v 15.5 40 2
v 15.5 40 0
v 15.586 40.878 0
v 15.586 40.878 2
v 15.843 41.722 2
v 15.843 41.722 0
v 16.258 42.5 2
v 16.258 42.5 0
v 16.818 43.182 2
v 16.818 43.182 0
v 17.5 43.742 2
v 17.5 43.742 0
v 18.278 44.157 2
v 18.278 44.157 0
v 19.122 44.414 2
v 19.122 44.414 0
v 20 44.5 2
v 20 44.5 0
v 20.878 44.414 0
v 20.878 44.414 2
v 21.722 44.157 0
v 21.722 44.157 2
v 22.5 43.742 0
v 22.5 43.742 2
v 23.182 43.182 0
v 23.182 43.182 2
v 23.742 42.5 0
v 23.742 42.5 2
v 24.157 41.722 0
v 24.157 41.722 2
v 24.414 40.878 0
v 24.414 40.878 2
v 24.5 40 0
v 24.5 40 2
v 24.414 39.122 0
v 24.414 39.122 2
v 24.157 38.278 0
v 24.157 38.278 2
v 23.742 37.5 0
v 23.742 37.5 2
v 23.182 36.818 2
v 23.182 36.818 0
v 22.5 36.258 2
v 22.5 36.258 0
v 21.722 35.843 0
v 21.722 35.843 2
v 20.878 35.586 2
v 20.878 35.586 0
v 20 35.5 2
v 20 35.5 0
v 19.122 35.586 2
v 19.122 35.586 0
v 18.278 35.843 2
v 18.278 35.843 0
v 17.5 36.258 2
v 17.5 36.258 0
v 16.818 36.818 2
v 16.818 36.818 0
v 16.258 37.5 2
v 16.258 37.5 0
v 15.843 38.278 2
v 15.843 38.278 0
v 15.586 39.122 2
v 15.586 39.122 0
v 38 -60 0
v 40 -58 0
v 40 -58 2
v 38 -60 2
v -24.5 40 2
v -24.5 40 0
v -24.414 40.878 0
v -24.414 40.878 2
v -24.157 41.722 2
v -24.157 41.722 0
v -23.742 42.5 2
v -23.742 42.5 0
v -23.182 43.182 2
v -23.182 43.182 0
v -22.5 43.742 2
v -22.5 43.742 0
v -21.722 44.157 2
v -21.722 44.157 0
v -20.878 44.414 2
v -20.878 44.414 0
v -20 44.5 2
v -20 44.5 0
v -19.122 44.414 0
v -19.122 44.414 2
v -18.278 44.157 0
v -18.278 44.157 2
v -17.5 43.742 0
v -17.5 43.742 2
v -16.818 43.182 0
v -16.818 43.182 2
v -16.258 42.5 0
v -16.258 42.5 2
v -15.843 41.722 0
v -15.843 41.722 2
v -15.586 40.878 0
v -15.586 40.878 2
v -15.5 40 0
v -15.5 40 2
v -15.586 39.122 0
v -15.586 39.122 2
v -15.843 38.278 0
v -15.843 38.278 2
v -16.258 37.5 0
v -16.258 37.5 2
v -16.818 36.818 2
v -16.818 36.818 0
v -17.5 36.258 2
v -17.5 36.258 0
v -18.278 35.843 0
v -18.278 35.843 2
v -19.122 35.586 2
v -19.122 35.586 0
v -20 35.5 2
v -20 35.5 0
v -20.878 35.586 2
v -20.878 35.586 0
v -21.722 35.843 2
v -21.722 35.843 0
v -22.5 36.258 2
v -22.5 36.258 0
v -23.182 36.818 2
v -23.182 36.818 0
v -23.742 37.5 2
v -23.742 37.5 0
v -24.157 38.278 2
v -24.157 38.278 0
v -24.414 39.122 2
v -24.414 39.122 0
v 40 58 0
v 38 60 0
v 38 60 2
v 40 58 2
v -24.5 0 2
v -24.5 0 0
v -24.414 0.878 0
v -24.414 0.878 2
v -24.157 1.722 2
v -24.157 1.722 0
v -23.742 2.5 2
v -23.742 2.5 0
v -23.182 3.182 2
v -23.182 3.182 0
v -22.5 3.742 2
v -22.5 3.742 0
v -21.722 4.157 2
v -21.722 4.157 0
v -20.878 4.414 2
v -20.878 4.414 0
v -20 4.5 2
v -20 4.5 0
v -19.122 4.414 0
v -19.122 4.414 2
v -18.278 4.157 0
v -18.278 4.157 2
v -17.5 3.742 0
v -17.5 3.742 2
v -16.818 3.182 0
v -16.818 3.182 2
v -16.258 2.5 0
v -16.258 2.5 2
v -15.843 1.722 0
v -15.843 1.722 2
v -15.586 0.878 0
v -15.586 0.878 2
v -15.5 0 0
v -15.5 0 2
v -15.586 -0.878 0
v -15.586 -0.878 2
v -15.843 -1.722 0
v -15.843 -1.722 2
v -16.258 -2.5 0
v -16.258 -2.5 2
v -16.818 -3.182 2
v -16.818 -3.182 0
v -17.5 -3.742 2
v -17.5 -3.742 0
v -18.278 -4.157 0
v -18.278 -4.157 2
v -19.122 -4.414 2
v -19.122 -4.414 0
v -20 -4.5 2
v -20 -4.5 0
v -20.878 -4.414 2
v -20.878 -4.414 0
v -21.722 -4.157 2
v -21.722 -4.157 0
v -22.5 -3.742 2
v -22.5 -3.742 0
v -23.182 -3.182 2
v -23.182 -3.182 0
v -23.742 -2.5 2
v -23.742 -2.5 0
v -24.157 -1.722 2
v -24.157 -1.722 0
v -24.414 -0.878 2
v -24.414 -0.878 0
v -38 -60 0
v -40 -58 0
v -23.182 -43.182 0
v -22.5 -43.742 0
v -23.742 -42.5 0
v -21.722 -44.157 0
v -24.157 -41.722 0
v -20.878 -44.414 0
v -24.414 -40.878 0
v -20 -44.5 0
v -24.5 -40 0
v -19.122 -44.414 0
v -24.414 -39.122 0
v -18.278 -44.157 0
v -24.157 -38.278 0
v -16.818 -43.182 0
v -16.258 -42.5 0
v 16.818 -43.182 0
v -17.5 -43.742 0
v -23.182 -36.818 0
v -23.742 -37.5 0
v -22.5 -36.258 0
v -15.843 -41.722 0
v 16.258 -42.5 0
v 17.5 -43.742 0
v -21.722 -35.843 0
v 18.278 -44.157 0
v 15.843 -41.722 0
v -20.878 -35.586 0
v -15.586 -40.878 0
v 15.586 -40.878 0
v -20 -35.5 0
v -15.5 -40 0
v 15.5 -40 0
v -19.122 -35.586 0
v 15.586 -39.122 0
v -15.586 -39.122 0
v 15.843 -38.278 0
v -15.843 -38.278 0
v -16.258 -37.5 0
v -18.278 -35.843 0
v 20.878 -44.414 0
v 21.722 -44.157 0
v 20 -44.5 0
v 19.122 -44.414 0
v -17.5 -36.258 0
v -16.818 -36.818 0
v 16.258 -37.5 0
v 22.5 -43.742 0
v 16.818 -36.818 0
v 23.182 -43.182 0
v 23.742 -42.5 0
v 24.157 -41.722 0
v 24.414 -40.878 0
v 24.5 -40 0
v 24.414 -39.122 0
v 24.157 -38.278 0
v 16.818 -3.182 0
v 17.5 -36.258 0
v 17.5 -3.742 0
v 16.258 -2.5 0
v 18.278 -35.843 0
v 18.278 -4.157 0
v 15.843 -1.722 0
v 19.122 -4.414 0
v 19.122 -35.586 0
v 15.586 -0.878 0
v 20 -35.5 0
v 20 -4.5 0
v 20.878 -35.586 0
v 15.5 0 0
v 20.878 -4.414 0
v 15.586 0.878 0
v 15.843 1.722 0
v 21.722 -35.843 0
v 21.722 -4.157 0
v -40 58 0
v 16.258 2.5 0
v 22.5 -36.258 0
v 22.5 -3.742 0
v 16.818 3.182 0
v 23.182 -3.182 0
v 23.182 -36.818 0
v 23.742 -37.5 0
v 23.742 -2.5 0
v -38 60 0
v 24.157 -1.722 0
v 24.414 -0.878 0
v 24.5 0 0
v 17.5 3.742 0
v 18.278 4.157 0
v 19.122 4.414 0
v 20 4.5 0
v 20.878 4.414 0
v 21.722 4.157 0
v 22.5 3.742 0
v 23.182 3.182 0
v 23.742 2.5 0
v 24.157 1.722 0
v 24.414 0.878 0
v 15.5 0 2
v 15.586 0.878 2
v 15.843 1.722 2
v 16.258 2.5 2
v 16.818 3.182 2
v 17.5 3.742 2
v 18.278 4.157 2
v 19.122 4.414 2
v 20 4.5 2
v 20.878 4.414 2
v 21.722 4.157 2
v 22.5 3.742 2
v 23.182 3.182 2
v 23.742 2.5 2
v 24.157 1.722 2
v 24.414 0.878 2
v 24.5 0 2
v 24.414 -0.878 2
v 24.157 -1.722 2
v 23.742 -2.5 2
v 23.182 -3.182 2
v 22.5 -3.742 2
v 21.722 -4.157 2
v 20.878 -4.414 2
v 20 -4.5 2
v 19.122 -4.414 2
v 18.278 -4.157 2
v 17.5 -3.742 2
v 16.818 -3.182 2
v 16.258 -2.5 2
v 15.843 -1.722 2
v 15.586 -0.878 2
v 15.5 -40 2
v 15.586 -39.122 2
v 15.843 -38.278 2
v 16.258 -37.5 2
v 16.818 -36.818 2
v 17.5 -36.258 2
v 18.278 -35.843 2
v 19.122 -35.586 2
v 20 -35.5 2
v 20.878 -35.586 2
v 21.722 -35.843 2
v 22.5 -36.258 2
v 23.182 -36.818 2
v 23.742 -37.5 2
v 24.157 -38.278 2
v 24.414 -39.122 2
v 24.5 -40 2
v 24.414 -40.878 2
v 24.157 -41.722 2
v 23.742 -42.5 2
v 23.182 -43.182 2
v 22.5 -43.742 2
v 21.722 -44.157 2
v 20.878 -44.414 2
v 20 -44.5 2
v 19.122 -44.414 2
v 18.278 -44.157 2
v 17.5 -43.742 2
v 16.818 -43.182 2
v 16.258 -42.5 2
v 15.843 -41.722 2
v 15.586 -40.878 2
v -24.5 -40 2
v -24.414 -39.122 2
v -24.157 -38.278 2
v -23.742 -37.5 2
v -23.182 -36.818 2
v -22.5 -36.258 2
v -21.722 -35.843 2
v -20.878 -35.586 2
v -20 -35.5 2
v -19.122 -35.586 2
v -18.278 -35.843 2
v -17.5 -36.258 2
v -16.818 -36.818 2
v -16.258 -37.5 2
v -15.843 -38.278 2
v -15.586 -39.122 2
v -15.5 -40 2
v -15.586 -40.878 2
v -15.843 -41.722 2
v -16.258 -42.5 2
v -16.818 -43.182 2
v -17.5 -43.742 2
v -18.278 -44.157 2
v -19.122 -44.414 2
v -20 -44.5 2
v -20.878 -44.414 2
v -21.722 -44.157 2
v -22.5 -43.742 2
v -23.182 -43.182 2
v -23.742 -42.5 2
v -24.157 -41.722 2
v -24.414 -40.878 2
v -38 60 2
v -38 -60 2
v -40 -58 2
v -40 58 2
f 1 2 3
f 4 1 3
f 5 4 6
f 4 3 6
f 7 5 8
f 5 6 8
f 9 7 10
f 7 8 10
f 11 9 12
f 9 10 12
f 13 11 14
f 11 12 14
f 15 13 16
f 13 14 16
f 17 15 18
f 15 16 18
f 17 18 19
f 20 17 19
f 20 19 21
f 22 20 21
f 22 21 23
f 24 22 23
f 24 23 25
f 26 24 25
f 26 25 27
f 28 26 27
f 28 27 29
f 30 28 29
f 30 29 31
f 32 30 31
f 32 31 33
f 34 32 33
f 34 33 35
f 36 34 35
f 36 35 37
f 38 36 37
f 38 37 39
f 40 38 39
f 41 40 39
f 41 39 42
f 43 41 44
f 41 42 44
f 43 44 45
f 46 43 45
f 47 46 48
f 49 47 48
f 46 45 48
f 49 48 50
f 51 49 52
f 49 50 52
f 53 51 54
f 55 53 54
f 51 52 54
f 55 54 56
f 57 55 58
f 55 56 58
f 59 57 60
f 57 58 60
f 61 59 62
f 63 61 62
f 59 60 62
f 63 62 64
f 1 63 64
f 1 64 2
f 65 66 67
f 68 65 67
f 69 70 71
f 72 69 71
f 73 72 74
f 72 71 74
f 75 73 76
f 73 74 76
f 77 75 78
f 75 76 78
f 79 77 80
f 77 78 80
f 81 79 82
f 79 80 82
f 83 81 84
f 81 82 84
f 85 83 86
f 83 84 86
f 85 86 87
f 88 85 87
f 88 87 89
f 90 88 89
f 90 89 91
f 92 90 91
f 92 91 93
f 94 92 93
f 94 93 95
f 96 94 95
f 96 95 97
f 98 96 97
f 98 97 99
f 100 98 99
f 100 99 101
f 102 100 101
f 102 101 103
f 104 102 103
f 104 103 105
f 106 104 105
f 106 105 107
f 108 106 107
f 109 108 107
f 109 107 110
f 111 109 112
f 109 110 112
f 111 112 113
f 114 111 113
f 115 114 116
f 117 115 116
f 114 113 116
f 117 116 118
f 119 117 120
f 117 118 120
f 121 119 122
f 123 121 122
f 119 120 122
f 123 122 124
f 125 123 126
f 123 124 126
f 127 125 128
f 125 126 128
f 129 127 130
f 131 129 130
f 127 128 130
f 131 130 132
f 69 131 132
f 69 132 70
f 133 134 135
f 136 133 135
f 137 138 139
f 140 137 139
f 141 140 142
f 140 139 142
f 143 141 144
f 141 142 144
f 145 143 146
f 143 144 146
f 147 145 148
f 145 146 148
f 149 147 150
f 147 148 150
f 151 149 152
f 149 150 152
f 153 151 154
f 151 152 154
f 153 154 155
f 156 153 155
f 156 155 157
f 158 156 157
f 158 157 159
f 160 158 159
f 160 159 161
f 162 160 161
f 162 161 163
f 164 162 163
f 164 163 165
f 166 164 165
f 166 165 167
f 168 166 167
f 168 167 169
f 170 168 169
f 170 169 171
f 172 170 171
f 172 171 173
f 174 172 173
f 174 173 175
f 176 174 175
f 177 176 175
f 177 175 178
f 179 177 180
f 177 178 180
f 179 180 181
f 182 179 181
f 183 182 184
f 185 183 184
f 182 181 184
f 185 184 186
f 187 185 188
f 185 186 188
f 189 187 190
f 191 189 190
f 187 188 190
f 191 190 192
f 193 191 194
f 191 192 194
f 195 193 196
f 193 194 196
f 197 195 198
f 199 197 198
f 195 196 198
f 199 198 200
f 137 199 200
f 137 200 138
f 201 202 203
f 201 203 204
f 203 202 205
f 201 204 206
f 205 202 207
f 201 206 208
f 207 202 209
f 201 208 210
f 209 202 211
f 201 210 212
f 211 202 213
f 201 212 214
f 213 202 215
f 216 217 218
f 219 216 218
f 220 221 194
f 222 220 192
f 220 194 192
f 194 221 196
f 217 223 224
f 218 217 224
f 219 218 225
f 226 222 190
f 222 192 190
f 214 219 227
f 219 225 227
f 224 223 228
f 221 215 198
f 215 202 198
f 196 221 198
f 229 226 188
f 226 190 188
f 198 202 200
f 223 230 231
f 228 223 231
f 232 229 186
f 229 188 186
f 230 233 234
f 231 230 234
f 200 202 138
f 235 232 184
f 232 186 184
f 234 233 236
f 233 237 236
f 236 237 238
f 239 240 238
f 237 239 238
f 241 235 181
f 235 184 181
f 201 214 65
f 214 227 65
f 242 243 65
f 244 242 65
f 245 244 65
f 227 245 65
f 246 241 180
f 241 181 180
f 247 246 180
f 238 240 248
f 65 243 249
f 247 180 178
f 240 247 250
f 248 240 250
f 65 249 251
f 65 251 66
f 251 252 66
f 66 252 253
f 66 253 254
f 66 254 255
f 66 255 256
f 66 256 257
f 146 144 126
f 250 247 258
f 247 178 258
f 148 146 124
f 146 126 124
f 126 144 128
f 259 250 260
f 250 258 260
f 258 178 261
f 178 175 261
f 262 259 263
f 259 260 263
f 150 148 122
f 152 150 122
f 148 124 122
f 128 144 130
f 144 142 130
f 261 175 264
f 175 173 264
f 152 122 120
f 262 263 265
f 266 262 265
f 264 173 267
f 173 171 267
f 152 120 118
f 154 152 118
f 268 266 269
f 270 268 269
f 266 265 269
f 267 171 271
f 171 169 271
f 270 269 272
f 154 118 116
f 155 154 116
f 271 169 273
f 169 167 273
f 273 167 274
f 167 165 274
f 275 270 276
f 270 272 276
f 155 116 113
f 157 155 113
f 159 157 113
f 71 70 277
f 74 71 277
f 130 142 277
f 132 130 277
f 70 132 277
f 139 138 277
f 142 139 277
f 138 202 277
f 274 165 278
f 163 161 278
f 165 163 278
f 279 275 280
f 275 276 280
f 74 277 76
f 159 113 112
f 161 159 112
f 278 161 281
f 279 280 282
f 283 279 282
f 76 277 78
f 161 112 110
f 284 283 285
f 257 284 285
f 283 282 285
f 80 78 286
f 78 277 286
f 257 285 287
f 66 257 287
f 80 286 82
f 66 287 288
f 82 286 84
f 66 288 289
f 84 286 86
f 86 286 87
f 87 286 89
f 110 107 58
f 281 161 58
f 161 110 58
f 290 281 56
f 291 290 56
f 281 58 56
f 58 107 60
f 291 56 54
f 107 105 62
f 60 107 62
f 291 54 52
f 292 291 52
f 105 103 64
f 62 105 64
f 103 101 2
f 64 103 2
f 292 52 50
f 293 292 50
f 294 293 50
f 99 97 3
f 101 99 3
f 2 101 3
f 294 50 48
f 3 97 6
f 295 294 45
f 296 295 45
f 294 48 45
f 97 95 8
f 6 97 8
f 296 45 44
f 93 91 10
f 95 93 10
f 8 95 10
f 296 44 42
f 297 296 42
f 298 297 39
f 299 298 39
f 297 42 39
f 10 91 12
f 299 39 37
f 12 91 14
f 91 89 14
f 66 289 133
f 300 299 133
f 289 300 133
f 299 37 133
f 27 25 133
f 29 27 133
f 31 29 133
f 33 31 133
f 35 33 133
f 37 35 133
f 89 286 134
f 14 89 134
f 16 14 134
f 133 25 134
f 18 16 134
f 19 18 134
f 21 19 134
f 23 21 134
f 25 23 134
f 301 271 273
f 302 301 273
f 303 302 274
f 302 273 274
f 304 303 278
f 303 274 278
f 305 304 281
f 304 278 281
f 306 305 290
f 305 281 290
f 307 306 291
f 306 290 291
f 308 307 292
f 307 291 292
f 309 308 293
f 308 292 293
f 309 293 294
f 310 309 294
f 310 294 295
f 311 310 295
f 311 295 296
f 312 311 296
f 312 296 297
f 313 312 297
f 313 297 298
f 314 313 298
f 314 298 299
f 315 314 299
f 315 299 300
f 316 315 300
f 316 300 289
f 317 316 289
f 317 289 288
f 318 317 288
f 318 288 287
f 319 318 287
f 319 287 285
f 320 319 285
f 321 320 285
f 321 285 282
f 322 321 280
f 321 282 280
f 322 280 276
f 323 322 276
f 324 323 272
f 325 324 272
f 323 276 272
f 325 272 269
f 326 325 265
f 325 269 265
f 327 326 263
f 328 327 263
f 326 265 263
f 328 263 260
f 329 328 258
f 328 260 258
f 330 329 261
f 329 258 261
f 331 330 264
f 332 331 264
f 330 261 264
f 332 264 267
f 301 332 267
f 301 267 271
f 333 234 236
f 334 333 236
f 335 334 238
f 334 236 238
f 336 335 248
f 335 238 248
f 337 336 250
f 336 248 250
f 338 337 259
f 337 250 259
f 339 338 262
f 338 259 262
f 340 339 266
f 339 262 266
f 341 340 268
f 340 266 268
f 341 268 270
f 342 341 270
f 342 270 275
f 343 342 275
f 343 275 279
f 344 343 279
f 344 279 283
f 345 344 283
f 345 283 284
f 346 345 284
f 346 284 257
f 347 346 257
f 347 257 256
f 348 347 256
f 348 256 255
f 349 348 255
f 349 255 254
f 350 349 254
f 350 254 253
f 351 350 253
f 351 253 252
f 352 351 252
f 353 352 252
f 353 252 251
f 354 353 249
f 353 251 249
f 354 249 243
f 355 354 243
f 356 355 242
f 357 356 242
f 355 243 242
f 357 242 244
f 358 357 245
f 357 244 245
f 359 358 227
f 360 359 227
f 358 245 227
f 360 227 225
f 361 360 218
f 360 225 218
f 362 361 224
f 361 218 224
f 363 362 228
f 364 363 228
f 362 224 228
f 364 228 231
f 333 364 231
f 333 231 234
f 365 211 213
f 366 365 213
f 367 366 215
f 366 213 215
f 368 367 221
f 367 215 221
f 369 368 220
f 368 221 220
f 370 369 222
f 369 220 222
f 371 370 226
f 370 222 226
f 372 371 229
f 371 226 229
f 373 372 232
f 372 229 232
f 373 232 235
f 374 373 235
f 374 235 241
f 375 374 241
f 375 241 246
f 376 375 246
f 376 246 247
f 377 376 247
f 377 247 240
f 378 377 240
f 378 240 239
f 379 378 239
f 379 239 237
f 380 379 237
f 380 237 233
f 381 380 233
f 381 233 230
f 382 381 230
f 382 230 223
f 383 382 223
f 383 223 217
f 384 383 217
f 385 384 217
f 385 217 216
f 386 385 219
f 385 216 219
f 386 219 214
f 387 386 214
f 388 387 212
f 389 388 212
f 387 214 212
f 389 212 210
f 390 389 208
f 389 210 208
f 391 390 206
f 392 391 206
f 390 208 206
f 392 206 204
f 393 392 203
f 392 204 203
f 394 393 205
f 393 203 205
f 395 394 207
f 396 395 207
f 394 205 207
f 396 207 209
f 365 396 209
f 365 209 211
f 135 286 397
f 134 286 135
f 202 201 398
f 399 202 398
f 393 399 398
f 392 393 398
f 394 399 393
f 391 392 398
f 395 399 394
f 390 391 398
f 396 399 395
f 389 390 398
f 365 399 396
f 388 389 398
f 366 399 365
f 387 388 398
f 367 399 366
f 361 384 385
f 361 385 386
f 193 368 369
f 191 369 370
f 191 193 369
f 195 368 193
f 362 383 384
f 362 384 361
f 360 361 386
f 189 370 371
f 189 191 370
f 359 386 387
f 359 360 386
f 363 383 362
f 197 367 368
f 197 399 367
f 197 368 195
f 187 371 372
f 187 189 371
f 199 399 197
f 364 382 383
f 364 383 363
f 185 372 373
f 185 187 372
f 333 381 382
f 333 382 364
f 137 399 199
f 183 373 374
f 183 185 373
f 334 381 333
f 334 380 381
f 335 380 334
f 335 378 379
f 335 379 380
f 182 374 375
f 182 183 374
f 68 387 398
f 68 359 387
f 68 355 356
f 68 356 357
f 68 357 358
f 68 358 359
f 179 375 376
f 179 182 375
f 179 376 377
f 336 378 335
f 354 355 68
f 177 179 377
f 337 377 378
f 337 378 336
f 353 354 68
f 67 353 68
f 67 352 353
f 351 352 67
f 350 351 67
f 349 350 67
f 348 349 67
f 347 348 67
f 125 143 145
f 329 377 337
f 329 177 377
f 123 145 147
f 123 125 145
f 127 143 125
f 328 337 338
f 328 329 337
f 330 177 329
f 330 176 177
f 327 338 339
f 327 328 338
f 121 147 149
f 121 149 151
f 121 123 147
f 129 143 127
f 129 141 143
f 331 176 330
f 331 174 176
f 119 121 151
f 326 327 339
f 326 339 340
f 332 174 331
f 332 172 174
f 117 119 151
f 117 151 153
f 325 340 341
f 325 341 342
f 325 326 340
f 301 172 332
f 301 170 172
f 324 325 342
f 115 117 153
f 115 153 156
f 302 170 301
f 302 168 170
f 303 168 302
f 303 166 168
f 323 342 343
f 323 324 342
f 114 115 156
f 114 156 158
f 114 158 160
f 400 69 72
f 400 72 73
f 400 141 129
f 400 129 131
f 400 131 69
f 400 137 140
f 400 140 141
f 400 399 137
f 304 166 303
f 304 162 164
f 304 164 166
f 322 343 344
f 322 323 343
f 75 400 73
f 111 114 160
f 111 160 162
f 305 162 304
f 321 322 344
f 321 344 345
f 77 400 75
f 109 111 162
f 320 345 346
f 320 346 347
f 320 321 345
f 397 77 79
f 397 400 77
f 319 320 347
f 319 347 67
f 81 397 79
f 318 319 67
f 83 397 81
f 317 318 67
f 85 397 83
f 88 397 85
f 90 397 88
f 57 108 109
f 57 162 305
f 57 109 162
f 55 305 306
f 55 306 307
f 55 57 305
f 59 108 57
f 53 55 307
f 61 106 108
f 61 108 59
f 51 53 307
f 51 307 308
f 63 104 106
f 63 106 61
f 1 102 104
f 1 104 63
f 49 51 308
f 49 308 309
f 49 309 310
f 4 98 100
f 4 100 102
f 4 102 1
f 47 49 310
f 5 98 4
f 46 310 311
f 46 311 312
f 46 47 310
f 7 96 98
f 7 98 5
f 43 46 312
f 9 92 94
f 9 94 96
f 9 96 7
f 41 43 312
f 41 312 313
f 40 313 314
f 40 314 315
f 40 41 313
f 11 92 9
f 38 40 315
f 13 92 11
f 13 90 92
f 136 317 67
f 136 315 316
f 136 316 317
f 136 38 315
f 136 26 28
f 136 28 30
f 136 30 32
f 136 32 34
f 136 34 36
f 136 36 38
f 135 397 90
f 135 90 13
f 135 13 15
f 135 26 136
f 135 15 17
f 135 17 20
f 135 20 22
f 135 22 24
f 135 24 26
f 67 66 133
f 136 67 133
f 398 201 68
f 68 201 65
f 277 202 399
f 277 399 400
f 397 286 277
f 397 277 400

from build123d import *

# Parameters (mm, degrees)
SKETCH_1_W        = 80
SKETCH_1_H        = 120
EXTRUDE_1_DEPTH   = 2
CHAMFER_1_SIZE    = 2
HOLE_WIZARD_M81_D = 9


with BuildPart() as part:
    # Эскиз1 → Бобышка-Вытянуть1 (new body)
    with BuildSketch(Plane.XY):
        Rectangle(SKETCH_1_W, SKETCH_1_H)
    extrude(amount=EXTRUDE_1_DEPTH)

    # Фаска1
    chamfer_1_edges = [part.edges().sort_by_distance(p)[0] for p in [
        (40, -60, 1),
        (-40, -60, 1),
        (-40, 60, 1),
        (40, 60, 1),
    ]]
    chamfer(chamfer_1_edges, length=CHAMFER_1_SIZE)

    # Отверстие с зазором M81 (through all)
    with Locations(Plane.XY.offset(2)):
        with Locations((-20, 40), (20, 40), (20, 0), (-20, 0), (-20, -40), (20, -40)):
            Hole(HOLE_WIZARD_M81_D / 2)


solid = part.part
